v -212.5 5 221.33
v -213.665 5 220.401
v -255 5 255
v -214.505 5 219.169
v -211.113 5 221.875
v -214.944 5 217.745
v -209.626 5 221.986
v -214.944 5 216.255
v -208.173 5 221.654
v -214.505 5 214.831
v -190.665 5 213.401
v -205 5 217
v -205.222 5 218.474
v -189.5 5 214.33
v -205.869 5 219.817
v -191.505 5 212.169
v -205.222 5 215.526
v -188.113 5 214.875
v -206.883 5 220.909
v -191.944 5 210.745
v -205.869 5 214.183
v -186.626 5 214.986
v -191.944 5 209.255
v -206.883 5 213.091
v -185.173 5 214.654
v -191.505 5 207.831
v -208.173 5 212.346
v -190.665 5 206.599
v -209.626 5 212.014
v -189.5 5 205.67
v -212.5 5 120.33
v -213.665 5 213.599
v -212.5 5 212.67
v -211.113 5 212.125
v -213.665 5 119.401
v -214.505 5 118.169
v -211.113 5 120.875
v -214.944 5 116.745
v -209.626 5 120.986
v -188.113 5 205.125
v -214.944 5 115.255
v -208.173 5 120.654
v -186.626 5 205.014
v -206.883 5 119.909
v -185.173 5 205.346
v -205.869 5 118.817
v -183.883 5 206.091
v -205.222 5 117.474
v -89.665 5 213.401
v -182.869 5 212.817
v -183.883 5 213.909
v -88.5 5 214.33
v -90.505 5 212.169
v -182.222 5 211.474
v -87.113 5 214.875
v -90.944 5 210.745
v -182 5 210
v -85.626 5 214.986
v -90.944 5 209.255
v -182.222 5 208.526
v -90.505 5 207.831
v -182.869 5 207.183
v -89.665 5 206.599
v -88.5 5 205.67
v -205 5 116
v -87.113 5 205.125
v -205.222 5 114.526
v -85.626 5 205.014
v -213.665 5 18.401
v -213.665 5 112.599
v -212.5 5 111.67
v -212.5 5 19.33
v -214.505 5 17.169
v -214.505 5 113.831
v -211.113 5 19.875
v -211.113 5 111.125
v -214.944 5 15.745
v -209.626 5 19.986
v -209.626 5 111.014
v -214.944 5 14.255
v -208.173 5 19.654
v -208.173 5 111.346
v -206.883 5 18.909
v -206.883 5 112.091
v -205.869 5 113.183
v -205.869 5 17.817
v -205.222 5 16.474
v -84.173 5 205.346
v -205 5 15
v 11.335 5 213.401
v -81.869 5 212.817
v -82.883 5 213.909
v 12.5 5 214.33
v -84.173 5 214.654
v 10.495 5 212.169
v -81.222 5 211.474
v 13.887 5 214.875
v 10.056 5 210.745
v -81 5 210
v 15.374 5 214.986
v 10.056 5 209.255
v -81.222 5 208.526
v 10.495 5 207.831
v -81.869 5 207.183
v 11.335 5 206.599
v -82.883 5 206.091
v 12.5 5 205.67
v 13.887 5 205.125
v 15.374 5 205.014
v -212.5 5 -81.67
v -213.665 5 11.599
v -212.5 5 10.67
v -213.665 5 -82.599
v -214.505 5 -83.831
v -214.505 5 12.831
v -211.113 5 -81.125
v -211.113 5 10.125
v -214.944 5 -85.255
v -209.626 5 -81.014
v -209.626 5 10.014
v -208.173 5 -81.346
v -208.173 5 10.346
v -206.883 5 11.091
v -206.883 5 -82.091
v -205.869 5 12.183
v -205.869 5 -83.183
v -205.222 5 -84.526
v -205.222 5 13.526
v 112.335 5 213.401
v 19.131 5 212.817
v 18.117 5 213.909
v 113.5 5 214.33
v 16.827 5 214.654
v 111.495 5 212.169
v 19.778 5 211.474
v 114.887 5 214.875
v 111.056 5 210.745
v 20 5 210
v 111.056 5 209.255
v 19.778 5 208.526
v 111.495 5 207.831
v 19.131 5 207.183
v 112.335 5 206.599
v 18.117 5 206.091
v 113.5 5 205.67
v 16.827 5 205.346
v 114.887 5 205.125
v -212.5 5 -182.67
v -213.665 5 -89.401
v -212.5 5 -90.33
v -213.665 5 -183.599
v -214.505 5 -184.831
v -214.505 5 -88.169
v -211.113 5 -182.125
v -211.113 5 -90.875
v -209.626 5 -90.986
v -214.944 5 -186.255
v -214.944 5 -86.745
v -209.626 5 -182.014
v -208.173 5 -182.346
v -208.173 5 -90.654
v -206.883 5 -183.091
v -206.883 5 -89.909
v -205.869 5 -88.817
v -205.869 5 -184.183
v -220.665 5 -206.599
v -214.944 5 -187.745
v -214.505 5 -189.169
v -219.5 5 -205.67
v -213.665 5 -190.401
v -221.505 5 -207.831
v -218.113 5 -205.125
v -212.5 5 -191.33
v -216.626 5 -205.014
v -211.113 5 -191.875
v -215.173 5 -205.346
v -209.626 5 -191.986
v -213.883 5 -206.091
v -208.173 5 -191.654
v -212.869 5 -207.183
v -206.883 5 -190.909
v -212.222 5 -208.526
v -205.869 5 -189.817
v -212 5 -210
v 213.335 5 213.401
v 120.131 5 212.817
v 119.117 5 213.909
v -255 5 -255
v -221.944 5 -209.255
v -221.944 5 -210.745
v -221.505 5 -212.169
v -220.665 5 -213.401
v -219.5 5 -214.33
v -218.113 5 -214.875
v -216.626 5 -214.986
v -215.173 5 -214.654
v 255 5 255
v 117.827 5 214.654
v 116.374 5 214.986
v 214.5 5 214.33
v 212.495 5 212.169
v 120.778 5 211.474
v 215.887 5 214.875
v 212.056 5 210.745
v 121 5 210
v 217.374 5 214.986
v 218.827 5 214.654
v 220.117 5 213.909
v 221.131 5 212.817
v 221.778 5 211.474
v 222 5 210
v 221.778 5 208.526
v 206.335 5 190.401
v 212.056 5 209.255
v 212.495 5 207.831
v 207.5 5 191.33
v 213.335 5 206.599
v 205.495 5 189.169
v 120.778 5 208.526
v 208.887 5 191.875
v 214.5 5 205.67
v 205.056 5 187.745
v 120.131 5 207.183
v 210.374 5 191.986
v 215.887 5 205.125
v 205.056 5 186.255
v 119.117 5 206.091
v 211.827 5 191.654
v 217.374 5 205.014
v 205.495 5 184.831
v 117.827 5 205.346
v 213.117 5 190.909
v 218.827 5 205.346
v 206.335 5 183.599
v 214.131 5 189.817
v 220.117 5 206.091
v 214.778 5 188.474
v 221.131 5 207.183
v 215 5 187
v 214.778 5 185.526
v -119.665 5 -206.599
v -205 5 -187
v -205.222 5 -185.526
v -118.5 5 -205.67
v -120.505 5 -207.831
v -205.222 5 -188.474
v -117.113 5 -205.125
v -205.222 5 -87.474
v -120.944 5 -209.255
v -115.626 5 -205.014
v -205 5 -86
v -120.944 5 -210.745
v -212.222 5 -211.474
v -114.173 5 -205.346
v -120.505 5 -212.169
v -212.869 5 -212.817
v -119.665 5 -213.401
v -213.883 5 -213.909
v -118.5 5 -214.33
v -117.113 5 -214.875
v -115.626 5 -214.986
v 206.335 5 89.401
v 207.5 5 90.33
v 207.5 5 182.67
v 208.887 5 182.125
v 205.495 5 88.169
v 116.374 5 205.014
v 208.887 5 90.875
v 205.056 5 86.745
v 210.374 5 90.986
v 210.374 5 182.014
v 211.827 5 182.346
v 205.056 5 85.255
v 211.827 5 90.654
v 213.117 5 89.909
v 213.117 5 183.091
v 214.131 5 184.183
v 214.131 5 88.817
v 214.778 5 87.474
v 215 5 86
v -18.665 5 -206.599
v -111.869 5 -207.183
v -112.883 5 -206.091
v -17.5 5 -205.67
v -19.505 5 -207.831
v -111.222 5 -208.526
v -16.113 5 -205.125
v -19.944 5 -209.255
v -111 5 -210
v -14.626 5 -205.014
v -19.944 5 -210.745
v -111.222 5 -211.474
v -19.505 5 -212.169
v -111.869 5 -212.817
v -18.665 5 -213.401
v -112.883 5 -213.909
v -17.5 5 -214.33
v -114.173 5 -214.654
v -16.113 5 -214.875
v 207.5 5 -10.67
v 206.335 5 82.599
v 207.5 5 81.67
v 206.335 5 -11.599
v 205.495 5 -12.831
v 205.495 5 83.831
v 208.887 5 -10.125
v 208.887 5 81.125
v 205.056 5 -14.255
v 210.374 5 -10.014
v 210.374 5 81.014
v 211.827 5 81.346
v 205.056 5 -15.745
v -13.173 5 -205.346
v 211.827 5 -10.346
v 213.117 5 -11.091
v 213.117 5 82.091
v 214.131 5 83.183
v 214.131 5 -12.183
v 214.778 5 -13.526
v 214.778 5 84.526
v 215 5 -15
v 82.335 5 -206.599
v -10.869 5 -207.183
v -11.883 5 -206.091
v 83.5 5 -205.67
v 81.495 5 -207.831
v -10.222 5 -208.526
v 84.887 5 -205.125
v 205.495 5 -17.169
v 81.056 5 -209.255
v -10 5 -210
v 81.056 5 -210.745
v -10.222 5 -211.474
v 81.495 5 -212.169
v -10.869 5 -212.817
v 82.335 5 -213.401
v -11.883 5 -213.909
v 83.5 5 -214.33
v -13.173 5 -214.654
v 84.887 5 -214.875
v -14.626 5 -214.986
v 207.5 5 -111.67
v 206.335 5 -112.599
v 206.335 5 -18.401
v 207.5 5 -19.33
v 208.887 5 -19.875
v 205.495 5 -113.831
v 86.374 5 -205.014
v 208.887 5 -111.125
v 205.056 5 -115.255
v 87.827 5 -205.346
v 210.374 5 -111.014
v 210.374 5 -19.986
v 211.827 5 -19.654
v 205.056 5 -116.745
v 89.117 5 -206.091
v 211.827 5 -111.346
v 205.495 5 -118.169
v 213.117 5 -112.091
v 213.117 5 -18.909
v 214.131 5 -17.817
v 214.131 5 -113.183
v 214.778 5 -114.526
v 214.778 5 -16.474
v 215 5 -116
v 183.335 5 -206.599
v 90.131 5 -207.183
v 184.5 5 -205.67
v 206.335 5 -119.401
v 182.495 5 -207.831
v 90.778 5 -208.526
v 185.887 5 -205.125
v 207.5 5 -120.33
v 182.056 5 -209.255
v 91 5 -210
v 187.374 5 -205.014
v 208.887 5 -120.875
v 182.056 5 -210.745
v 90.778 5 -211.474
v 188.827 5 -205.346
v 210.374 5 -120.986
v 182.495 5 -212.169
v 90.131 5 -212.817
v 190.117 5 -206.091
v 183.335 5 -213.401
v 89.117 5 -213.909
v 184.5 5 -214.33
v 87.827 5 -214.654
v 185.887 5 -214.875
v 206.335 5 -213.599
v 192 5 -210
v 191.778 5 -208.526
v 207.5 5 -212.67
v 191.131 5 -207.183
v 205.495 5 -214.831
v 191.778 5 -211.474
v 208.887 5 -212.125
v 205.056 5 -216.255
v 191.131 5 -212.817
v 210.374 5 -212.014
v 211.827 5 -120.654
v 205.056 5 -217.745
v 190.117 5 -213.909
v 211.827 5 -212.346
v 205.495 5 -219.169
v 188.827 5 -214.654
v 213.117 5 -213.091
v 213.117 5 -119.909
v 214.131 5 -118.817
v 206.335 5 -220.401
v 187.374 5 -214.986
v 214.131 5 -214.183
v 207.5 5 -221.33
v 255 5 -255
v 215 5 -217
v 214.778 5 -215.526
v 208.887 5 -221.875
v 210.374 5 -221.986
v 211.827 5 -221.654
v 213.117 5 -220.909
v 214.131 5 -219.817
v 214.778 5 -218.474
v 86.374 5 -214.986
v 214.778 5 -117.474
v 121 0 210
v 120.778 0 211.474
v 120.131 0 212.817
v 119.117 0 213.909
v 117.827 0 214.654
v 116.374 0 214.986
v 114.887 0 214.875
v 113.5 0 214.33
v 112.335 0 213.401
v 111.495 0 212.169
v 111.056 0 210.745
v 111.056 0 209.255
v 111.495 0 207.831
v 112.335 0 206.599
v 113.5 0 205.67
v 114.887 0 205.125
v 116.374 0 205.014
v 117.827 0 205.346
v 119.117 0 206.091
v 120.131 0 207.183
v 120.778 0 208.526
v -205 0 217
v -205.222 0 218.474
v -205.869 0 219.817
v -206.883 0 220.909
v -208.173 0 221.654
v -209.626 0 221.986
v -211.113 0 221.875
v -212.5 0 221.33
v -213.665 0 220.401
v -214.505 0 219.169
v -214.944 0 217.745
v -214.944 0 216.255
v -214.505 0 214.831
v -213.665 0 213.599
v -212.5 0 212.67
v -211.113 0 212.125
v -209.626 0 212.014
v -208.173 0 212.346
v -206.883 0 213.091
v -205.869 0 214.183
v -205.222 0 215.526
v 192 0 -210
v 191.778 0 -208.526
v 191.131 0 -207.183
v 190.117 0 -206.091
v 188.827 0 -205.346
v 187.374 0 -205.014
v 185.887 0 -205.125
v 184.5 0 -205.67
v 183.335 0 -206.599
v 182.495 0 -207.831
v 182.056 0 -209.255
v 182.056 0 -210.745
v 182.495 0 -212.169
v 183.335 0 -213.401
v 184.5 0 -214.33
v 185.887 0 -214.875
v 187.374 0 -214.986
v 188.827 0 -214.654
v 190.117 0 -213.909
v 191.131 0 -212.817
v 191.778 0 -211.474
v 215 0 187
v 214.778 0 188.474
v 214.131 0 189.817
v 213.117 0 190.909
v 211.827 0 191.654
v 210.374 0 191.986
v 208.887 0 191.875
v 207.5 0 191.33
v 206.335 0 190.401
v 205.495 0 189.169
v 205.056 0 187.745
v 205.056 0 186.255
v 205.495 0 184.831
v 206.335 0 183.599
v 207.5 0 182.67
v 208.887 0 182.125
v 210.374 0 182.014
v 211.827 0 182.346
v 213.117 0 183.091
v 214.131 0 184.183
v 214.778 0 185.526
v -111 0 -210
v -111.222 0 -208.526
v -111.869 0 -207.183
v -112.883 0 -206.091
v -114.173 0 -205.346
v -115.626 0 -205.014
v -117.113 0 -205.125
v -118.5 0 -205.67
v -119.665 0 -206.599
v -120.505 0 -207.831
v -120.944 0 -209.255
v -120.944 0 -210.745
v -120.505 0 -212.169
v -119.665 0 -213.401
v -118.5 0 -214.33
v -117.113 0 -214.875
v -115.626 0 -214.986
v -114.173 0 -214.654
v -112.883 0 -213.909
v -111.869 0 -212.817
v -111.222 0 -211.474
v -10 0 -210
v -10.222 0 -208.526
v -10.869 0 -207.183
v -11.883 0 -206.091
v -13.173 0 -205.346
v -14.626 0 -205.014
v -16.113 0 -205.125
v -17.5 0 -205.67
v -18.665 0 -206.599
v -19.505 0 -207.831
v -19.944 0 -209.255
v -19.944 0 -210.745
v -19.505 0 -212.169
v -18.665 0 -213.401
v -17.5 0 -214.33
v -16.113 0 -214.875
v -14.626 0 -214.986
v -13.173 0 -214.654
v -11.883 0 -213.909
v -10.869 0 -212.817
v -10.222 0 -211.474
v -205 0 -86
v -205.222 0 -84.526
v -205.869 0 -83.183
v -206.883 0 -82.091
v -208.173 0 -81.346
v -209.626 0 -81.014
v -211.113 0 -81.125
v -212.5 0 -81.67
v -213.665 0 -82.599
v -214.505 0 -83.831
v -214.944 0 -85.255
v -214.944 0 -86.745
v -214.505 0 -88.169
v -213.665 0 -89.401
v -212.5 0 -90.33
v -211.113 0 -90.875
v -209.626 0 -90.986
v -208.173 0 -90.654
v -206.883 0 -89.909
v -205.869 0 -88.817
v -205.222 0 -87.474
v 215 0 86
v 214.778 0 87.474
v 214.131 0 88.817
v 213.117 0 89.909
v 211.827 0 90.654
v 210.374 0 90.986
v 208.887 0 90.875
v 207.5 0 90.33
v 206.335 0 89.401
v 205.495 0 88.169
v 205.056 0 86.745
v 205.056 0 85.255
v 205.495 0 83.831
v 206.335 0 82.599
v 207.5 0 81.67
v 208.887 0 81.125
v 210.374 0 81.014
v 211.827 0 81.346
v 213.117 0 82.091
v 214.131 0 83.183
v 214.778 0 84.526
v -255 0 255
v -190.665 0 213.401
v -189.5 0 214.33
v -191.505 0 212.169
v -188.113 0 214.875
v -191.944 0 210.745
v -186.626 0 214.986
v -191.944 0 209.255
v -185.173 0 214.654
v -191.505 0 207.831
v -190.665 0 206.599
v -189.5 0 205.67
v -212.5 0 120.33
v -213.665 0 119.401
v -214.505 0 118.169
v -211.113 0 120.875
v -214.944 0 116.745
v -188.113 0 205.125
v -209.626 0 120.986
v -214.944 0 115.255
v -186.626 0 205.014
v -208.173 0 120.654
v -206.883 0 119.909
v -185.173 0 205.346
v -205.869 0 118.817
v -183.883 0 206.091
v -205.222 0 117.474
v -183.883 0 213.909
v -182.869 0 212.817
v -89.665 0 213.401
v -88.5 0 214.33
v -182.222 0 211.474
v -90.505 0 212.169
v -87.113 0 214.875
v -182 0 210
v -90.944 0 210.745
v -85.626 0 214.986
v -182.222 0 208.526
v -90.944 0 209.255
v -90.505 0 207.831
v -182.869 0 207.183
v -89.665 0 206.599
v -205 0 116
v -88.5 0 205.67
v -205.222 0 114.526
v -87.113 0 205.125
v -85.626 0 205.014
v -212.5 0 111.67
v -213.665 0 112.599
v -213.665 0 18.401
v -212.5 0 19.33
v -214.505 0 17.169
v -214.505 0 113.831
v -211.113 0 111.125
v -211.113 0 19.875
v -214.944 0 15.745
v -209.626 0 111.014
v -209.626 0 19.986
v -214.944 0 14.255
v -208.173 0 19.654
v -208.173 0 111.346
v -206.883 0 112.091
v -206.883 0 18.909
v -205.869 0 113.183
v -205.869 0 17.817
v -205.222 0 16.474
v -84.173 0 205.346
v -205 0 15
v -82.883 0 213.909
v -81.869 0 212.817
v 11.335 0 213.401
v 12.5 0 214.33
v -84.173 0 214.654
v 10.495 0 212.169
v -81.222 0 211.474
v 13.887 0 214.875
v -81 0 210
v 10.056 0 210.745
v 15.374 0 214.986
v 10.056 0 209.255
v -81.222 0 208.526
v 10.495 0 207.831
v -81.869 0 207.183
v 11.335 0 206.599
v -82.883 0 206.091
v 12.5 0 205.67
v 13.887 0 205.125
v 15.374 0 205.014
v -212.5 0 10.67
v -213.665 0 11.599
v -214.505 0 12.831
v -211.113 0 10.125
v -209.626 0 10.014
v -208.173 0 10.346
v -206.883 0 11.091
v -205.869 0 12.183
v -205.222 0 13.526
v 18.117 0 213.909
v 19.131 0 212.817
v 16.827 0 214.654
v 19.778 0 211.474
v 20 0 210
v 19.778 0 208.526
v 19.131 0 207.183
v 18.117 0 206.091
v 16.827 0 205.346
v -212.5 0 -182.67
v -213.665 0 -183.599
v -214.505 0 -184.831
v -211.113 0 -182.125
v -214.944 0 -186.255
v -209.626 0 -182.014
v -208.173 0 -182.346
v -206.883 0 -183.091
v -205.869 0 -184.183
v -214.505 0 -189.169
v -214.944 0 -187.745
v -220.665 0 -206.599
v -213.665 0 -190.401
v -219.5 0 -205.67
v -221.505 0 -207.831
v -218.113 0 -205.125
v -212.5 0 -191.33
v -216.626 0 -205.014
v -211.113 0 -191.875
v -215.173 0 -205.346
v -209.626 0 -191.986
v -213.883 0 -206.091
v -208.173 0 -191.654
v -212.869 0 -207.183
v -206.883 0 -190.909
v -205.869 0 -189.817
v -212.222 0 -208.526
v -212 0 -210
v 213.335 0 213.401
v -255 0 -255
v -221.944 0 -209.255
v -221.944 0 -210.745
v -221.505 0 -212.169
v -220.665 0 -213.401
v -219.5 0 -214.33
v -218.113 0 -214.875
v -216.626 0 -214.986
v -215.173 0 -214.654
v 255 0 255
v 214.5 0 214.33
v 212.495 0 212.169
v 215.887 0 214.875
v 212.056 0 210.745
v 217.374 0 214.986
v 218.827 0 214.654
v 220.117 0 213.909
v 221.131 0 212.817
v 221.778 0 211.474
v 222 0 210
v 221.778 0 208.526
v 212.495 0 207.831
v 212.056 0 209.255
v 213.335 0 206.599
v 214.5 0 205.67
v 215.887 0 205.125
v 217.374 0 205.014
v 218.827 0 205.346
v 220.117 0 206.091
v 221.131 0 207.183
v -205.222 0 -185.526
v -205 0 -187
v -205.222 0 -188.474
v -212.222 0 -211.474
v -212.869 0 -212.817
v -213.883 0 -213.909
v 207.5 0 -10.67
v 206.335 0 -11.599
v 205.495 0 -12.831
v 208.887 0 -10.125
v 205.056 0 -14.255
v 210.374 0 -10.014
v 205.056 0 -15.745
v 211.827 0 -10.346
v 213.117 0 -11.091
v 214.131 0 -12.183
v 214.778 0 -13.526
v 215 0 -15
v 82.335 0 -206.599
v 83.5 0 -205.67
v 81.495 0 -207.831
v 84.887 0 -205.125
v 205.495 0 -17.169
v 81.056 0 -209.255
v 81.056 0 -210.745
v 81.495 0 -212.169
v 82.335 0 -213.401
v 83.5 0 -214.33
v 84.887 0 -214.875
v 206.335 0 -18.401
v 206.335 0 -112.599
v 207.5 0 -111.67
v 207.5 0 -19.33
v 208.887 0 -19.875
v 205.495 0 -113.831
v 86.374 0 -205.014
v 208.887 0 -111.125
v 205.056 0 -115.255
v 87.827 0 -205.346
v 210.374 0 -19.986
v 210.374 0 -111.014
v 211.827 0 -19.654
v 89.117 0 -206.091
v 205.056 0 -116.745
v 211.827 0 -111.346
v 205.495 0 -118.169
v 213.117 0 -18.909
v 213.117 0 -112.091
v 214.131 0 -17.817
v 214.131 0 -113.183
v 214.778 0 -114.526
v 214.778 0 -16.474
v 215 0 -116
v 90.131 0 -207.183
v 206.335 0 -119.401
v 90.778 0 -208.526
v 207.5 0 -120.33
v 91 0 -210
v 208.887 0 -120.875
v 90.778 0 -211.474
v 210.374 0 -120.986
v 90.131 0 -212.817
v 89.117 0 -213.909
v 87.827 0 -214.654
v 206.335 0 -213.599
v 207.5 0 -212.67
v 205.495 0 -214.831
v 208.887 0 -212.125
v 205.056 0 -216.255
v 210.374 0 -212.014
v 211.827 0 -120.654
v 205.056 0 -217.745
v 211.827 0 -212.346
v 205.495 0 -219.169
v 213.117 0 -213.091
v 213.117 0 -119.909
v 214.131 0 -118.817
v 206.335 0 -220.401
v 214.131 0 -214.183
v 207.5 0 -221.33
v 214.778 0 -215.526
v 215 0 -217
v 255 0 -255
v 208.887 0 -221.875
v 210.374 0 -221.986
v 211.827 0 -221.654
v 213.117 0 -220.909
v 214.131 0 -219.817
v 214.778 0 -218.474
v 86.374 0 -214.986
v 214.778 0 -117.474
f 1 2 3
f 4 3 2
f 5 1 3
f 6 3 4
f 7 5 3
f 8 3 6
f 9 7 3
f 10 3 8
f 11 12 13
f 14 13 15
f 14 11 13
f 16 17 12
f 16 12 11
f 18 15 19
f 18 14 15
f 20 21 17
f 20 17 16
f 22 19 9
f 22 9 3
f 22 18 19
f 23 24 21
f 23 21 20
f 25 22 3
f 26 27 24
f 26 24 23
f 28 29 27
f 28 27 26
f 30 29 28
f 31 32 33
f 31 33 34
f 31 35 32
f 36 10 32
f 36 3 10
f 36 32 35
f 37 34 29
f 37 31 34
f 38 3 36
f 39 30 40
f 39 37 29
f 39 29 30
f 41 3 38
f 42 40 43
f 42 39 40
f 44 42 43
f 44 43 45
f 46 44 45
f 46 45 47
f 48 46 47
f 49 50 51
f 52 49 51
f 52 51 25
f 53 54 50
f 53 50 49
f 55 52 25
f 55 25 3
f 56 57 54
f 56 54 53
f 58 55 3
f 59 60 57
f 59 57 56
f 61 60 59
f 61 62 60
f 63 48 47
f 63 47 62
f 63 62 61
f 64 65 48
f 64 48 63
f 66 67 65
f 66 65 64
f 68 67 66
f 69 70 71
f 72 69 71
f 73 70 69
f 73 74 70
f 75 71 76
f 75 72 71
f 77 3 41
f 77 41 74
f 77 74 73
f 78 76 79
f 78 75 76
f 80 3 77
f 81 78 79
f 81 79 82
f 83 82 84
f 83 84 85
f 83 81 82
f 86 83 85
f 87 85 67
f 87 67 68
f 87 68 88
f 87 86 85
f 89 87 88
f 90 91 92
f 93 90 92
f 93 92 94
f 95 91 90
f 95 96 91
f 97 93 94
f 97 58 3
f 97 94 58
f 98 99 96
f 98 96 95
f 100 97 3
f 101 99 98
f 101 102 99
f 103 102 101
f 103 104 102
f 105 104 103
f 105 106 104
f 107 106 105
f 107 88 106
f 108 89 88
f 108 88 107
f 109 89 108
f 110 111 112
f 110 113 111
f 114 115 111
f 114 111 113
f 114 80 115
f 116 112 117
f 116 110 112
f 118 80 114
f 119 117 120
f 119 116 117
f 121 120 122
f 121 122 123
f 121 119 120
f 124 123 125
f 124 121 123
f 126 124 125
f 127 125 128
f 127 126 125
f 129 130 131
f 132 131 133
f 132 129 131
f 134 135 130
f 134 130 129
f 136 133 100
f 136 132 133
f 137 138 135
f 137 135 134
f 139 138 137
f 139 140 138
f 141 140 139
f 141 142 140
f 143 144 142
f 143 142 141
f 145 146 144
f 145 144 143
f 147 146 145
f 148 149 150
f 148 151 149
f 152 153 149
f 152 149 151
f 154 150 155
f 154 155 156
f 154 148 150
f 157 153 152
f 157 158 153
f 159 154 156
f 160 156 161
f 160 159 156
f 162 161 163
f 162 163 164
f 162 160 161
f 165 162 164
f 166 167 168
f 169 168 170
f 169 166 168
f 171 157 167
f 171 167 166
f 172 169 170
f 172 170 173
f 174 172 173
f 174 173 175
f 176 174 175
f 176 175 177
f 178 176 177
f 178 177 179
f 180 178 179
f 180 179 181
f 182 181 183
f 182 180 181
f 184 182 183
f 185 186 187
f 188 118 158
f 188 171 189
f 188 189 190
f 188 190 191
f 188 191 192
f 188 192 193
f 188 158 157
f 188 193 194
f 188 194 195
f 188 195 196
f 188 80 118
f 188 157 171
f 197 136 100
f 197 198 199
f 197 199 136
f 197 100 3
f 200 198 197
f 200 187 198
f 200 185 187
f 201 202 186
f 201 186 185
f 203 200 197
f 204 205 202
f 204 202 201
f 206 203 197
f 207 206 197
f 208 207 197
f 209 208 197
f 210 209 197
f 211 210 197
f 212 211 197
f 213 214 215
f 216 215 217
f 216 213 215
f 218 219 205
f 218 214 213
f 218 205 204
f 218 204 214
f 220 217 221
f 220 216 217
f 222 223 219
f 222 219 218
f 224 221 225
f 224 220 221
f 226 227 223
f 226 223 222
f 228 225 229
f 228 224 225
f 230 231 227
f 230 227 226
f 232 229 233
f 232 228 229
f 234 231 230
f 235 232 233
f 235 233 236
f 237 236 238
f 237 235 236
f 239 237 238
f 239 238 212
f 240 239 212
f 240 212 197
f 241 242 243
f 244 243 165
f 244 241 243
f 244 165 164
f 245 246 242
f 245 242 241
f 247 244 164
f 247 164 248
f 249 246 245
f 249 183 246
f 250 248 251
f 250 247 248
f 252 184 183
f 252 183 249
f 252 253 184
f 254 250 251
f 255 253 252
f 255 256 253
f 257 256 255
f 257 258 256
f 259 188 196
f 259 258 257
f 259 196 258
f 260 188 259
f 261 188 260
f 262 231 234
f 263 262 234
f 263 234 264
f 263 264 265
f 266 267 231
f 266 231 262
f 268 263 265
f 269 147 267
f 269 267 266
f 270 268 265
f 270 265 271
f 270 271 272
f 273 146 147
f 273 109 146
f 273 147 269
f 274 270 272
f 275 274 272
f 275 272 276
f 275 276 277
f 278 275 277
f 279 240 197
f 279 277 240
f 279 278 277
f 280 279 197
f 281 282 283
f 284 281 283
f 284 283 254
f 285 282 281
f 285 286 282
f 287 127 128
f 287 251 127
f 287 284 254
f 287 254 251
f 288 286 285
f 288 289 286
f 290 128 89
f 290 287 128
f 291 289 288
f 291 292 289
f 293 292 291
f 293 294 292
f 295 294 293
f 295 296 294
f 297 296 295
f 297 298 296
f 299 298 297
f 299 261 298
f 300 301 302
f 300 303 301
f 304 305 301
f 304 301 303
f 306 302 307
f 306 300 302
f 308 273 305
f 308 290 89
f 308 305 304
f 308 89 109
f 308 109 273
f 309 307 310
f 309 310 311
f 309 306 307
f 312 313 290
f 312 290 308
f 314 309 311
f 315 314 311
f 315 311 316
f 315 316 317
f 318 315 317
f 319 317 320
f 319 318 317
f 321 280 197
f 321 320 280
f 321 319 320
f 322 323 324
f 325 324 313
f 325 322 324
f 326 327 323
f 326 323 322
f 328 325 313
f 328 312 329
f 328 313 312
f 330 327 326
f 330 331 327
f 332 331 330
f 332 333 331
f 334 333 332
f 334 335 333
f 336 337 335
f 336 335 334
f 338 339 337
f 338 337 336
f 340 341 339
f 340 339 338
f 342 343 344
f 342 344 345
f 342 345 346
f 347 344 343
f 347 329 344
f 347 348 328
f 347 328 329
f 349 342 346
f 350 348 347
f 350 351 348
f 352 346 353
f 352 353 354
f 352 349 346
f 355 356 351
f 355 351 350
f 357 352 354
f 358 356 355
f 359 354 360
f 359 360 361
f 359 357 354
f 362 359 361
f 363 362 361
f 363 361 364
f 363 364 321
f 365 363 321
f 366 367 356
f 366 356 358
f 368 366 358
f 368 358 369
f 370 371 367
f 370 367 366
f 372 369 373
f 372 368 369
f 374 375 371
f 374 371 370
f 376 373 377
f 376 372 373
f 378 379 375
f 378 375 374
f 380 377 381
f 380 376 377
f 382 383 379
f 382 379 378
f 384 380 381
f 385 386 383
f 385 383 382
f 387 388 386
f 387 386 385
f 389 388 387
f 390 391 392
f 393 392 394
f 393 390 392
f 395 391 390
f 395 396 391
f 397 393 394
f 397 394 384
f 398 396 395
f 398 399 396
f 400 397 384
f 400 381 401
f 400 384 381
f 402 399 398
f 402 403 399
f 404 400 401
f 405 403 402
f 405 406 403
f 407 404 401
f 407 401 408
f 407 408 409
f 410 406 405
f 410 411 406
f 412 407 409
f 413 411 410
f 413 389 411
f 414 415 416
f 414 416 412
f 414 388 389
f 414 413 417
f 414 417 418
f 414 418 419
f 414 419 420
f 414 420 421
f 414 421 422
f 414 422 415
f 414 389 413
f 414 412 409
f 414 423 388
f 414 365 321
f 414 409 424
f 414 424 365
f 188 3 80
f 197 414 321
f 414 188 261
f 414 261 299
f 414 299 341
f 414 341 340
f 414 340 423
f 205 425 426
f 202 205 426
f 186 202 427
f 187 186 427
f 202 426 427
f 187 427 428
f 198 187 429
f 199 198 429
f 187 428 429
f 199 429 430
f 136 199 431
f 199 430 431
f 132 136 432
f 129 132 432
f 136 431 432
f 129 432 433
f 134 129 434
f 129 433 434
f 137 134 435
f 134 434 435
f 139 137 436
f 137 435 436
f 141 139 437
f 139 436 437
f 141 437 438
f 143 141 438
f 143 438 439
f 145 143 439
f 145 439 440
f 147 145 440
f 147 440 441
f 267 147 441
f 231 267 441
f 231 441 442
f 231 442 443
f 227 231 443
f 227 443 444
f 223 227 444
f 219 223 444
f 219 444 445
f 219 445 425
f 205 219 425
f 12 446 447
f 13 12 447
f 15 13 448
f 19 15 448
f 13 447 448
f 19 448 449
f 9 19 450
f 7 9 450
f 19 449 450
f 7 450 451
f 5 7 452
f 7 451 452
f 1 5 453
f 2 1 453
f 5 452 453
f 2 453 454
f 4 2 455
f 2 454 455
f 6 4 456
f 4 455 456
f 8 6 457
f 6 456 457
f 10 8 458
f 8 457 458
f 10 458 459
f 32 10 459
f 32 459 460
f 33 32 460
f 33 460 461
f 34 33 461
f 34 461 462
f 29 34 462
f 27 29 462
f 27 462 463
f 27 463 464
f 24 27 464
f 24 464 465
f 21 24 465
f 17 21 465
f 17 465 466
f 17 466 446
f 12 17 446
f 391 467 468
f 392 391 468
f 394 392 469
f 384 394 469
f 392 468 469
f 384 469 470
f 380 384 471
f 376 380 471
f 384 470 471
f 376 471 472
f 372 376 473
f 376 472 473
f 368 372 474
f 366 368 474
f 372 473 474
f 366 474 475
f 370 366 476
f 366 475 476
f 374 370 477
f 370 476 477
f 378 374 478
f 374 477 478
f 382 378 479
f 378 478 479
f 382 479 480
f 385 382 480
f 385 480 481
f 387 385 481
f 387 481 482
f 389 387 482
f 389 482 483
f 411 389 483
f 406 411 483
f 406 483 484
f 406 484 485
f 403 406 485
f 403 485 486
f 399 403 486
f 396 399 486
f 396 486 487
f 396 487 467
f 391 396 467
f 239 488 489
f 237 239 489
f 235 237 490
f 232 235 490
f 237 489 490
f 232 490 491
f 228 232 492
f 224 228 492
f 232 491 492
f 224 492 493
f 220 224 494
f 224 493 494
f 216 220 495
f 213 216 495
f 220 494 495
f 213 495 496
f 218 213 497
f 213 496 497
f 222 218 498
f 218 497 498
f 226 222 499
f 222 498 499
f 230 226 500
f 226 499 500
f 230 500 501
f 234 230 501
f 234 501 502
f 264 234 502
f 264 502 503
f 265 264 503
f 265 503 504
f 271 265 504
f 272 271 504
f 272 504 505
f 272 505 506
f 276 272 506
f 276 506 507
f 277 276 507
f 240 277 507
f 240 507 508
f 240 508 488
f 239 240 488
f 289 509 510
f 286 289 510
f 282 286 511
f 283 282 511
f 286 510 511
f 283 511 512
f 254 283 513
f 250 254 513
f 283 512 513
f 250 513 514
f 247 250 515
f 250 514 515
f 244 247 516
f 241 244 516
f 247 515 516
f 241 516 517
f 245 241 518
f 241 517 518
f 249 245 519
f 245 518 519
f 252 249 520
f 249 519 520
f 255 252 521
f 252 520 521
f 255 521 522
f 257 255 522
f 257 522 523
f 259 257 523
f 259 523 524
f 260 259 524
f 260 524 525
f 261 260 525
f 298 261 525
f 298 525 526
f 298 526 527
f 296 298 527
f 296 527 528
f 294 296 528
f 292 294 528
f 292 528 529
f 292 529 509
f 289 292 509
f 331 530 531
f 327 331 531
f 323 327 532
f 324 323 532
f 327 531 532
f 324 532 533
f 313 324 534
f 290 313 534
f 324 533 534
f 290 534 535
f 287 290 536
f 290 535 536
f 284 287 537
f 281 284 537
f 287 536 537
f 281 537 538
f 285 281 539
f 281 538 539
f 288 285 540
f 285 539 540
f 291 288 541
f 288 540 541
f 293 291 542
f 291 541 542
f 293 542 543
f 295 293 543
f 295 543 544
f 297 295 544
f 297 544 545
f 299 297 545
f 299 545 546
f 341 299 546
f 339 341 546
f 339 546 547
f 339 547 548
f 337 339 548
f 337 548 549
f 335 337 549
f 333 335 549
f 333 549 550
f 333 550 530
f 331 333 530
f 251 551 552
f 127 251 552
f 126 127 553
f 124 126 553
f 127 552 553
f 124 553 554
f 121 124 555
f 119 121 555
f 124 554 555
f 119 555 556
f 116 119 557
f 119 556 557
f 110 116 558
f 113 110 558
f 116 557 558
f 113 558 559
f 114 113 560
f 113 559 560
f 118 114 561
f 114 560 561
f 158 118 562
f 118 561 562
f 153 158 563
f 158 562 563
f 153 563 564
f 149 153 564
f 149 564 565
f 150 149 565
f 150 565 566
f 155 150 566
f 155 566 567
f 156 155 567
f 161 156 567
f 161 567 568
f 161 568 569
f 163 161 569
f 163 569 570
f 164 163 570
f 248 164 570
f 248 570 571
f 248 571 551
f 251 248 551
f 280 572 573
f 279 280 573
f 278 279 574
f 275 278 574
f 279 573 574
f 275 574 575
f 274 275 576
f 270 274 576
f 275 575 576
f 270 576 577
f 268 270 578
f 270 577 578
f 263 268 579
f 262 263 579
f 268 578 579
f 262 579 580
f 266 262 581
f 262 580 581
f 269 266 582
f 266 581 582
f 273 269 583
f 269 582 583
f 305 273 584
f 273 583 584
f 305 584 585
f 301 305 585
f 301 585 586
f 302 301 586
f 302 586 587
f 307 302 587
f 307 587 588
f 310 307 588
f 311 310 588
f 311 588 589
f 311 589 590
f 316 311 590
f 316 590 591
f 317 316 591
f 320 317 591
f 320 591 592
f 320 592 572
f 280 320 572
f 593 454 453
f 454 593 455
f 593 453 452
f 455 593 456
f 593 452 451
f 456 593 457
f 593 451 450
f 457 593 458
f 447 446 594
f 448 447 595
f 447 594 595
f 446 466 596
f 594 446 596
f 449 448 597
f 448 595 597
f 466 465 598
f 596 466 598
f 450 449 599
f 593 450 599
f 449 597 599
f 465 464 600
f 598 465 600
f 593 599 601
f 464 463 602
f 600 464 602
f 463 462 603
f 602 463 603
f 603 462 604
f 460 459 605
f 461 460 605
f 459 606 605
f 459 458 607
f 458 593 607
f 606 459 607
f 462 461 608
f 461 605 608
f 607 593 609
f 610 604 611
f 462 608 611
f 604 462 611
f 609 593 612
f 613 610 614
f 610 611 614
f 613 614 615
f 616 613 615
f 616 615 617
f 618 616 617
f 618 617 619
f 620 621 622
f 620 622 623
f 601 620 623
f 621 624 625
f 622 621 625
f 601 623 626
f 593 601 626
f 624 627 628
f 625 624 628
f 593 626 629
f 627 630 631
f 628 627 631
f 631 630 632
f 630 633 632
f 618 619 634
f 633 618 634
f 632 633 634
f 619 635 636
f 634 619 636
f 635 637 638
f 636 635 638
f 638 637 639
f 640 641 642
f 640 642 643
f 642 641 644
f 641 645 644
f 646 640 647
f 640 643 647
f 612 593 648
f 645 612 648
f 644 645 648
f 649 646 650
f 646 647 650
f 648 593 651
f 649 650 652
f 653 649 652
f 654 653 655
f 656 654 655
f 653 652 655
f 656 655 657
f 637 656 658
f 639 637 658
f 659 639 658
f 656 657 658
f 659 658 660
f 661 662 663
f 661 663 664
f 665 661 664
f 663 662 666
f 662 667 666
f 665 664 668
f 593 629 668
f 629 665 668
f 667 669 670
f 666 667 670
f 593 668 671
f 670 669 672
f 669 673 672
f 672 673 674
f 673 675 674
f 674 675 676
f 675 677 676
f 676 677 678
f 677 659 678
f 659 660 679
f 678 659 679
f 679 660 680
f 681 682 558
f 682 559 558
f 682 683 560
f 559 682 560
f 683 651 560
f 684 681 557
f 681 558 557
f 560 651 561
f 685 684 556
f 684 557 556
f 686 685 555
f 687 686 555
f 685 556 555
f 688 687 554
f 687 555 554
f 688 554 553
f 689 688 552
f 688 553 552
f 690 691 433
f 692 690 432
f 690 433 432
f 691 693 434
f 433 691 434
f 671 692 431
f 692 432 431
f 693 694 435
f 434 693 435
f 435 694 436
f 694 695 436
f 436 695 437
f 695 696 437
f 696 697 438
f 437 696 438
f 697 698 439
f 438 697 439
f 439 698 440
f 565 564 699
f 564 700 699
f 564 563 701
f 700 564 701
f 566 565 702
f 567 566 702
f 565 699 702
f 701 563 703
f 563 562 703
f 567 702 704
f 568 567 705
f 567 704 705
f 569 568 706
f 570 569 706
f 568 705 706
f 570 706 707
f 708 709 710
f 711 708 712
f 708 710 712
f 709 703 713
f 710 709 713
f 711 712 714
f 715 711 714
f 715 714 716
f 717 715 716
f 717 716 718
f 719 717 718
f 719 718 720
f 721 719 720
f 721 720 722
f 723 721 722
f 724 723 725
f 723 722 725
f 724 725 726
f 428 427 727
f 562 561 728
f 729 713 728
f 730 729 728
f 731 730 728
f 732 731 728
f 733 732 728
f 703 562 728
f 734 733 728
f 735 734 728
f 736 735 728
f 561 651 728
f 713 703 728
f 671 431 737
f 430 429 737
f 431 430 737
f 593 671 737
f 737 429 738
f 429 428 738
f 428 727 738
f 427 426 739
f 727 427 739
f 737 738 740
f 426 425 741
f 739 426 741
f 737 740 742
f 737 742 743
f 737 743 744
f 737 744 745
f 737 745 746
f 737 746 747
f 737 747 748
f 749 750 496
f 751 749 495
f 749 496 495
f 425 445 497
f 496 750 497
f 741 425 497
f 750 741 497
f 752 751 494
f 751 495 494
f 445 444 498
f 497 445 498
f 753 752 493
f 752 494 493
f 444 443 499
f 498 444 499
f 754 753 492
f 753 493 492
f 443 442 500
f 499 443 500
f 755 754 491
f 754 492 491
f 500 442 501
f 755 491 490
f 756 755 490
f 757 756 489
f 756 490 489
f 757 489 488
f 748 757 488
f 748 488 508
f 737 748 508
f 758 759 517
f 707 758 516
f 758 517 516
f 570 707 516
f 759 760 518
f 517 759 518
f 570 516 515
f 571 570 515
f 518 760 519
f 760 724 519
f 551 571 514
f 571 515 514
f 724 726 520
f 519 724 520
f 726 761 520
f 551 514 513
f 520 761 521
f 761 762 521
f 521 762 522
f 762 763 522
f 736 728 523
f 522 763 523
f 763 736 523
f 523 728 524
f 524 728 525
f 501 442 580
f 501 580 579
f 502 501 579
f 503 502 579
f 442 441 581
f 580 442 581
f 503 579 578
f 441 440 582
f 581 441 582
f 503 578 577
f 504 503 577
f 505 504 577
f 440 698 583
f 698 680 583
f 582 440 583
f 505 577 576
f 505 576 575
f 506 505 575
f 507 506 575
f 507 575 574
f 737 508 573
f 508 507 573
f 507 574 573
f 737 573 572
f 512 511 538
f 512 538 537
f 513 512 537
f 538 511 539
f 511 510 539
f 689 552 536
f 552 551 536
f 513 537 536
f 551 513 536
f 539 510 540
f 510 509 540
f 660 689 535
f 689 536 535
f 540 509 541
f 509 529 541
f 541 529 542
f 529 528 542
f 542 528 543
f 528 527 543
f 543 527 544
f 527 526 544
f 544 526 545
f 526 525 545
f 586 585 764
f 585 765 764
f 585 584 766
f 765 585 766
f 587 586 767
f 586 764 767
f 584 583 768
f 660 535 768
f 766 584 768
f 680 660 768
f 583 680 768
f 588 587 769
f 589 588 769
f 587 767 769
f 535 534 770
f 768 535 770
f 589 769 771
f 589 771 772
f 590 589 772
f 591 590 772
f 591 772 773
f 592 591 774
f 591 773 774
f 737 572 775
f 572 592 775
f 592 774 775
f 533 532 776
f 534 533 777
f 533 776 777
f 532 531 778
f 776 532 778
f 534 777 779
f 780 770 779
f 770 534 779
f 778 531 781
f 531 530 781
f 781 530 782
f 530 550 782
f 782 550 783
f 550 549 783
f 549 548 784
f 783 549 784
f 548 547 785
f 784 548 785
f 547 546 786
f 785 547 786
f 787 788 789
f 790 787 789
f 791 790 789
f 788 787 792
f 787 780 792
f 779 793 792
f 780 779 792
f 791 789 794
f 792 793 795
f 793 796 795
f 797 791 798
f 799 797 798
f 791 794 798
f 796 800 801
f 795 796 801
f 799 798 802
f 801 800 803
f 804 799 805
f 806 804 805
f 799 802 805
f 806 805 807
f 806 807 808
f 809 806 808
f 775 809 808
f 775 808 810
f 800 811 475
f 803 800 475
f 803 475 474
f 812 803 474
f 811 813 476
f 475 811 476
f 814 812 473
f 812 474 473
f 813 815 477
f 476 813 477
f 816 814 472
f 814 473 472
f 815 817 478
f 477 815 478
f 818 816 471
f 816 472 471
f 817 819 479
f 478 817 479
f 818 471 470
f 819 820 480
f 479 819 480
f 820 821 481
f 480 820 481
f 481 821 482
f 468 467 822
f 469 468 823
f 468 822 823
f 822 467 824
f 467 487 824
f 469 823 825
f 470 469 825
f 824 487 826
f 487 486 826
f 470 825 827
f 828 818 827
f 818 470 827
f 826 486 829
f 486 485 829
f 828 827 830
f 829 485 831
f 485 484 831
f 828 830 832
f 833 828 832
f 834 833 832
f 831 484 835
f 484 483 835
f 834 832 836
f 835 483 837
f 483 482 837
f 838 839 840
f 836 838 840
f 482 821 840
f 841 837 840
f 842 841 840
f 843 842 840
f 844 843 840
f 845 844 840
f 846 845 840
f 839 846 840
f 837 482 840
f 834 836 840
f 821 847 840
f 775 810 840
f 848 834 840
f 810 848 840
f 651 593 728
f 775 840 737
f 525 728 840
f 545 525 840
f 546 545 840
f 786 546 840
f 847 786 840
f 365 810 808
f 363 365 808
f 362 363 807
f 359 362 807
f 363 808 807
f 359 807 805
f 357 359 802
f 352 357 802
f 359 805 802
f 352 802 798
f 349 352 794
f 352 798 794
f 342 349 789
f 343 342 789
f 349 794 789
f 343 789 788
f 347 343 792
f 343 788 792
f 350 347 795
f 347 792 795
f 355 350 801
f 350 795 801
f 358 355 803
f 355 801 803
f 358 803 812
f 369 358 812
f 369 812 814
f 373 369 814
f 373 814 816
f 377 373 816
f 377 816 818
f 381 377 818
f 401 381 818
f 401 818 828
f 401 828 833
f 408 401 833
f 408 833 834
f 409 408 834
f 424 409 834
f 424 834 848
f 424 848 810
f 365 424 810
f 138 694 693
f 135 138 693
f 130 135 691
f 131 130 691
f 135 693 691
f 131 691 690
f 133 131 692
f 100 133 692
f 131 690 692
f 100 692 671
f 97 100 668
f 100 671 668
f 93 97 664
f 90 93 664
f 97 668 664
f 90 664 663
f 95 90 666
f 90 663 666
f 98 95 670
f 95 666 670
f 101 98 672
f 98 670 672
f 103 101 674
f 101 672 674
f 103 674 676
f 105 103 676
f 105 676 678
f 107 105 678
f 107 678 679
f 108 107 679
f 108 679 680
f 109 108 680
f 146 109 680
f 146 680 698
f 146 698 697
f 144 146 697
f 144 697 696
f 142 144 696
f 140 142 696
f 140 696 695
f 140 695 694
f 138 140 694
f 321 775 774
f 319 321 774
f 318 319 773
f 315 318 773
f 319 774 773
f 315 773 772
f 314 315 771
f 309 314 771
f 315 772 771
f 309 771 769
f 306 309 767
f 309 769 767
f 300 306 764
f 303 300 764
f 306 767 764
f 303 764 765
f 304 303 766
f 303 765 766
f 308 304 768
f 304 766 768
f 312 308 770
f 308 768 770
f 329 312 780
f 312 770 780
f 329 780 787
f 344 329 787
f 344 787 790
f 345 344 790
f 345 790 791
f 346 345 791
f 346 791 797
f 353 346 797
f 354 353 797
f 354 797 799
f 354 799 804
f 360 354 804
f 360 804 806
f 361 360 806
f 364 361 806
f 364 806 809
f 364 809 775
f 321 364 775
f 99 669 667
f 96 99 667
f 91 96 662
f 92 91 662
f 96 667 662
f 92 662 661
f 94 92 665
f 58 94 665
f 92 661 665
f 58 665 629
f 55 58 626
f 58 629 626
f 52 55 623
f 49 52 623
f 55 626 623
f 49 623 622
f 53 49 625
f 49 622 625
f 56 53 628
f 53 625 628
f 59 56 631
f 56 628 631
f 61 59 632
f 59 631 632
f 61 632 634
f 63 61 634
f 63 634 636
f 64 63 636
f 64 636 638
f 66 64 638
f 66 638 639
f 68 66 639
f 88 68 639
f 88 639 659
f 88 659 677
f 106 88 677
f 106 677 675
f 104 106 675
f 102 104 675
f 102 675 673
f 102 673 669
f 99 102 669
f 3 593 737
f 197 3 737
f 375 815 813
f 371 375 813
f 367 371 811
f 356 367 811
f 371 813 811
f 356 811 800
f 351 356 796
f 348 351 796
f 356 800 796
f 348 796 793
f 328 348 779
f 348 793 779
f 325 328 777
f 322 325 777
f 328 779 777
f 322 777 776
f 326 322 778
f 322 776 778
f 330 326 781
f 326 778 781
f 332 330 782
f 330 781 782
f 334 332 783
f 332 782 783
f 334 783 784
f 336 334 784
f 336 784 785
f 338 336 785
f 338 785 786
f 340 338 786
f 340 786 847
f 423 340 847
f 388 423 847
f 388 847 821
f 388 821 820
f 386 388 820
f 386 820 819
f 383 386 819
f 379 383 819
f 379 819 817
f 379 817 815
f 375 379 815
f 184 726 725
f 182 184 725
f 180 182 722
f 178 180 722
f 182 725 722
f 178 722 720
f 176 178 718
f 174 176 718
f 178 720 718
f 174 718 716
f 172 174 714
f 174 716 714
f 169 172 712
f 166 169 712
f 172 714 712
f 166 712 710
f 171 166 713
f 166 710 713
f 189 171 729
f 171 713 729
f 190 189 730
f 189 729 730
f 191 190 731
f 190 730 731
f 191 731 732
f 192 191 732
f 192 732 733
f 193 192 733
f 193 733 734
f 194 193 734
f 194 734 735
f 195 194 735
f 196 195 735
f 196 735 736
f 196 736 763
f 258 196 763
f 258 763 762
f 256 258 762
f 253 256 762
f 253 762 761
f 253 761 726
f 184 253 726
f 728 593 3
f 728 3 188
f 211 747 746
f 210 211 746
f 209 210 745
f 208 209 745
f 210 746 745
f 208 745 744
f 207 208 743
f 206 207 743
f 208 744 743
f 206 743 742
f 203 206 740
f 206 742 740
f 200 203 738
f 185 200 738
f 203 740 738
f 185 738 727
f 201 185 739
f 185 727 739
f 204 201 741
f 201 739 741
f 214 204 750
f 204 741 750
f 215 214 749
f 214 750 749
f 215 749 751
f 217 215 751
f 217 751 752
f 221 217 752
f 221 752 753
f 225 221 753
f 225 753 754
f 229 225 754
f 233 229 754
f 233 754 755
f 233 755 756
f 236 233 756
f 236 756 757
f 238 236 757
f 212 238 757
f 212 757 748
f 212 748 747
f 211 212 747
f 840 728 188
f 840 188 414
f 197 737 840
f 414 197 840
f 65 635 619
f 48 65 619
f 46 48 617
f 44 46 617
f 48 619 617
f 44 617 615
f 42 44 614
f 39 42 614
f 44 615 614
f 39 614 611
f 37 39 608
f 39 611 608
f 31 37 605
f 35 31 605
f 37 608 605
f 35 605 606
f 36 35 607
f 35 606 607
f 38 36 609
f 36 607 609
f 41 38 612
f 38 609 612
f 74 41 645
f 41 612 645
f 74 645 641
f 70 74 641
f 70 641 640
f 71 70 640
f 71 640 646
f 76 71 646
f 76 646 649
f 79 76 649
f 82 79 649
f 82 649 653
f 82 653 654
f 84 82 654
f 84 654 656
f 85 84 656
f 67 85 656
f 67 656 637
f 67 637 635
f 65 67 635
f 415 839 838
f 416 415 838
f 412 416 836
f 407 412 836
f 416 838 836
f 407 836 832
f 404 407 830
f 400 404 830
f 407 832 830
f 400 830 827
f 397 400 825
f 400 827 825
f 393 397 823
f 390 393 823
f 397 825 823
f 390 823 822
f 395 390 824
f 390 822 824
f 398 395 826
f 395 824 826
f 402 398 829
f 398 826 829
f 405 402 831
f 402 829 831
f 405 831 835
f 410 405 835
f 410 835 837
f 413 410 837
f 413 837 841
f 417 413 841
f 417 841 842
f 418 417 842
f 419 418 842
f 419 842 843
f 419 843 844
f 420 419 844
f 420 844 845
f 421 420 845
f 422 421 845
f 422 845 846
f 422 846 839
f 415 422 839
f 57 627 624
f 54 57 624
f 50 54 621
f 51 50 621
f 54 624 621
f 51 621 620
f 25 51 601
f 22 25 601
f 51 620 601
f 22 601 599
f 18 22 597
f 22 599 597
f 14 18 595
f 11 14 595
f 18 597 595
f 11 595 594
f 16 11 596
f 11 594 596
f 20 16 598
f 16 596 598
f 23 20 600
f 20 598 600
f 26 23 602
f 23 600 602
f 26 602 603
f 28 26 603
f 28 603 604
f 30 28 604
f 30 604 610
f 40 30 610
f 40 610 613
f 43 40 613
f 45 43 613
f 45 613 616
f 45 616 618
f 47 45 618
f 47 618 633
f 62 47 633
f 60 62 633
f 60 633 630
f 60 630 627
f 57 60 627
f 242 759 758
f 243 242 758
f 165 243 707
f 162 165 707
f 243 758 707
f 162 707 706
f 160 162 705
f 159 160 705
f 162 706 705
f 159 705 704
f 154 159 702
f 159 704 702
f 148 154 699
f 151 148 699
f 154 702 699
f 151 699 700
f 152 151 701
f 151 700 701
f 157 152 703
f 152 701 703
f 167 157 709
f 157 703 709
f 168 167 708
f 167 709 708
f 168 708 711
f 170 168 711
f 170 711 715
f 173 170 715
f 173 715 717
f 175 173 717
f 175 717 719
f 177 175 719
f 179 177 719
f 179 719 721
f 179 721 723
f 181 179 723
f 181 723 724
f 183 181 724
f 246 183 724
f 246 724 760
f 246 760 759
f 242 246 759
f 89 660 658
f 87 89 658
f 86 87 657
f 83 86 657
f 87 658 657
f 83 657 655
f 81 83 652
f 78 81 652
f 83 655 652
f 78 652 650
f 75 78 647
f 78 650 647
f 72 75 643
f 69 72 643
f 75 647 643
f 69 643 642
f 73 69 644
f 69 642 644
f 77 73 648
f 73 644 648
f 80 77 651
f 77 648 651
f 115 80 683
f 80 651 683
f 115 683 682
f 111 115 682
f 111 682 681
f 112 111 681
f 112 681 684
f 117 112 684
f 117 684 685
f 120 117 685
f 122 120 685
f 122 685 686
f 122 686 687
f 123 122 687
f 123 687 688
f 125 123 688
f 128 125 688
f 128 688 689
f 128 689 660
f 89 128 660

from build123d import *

# Parameters (mm, degrees)
SKETCH1_W           = 510
SKETCH1_H           = 510
BOSS_EXTRUDE1_DEPTH = 5
SKETCH3_R           = 5
CUT_EXTRUDE1_DEPTH  = 6


with BuildPart() as part:
    # Sketch1 → Boss-Extrude1 (new body)
    with BuildSketch(Plane(origin=(0, 0, 0), x_dir=(1, 0, 0), z_dir=(0, 1, 0))):
        Rectangle(SKETCH1_W, SKETCH1_H)
    extrude(amount=BOSS_EXTRUDE1_DEPTH)

    # Sketch3 → Cut-Extrude1 (cut, through all)
    with BuildSketch(Plane.XZ):
        with Locations((217, 210)):
            Circle(SKETCH3_R)
        with Locations((116, 210)):
            Circle(SKETCH3_R)
        with Locations((15, 210)):
            Circle(SKETCH3_R)
        with Locations((-86, 210)):
            Circle(SKETCH3_R)
        with Locations((-187, 210)):
            Circle(SKETCH3_R)
        with Locations((-210, 217)):
            Circle(SKETCH3_R)
        with Locations((-210, 116)):
            Circle(SKETCH3_R)
        with Locations((-210, 15)):
            Circle(SKETCH3_R)
        with Locations((-210, -86)):
            Circle(SKETCH3_R)
        with Locations((-210, -187)):
            Circle(SKETCH3_R)
        with Locations((-217, -210)):
            Circle(SKETCH3_R)
        with Locations((-116, -210)):
            Circle(SKETCH3_R)
        with Locations((-15, -210)):
            Circle(SKETCH3_R)
        with Locations((86, -210)):
            Circle(SKETCH3_R)
        with Locations((187, -210)):
            Circle(SKETCH3_R)
        with Locations((210, -217)):
            Circle(SKETCH3_R)
        with Locations((210, -116)):
            Circle(SKETCH3_R)
        with Locations((210, -15)):
            Circle(SKETCH3_R)
        with Locations((210, 86)):
            Circle(SKETCH3_R)
        with Locations((210, 187)):
            Circle(SKETCH3_R)
    extrude(amount=-CUT_EXTRUDE1_DEPTH, mode=Mode.SUBTRACT)


solid = part.part
